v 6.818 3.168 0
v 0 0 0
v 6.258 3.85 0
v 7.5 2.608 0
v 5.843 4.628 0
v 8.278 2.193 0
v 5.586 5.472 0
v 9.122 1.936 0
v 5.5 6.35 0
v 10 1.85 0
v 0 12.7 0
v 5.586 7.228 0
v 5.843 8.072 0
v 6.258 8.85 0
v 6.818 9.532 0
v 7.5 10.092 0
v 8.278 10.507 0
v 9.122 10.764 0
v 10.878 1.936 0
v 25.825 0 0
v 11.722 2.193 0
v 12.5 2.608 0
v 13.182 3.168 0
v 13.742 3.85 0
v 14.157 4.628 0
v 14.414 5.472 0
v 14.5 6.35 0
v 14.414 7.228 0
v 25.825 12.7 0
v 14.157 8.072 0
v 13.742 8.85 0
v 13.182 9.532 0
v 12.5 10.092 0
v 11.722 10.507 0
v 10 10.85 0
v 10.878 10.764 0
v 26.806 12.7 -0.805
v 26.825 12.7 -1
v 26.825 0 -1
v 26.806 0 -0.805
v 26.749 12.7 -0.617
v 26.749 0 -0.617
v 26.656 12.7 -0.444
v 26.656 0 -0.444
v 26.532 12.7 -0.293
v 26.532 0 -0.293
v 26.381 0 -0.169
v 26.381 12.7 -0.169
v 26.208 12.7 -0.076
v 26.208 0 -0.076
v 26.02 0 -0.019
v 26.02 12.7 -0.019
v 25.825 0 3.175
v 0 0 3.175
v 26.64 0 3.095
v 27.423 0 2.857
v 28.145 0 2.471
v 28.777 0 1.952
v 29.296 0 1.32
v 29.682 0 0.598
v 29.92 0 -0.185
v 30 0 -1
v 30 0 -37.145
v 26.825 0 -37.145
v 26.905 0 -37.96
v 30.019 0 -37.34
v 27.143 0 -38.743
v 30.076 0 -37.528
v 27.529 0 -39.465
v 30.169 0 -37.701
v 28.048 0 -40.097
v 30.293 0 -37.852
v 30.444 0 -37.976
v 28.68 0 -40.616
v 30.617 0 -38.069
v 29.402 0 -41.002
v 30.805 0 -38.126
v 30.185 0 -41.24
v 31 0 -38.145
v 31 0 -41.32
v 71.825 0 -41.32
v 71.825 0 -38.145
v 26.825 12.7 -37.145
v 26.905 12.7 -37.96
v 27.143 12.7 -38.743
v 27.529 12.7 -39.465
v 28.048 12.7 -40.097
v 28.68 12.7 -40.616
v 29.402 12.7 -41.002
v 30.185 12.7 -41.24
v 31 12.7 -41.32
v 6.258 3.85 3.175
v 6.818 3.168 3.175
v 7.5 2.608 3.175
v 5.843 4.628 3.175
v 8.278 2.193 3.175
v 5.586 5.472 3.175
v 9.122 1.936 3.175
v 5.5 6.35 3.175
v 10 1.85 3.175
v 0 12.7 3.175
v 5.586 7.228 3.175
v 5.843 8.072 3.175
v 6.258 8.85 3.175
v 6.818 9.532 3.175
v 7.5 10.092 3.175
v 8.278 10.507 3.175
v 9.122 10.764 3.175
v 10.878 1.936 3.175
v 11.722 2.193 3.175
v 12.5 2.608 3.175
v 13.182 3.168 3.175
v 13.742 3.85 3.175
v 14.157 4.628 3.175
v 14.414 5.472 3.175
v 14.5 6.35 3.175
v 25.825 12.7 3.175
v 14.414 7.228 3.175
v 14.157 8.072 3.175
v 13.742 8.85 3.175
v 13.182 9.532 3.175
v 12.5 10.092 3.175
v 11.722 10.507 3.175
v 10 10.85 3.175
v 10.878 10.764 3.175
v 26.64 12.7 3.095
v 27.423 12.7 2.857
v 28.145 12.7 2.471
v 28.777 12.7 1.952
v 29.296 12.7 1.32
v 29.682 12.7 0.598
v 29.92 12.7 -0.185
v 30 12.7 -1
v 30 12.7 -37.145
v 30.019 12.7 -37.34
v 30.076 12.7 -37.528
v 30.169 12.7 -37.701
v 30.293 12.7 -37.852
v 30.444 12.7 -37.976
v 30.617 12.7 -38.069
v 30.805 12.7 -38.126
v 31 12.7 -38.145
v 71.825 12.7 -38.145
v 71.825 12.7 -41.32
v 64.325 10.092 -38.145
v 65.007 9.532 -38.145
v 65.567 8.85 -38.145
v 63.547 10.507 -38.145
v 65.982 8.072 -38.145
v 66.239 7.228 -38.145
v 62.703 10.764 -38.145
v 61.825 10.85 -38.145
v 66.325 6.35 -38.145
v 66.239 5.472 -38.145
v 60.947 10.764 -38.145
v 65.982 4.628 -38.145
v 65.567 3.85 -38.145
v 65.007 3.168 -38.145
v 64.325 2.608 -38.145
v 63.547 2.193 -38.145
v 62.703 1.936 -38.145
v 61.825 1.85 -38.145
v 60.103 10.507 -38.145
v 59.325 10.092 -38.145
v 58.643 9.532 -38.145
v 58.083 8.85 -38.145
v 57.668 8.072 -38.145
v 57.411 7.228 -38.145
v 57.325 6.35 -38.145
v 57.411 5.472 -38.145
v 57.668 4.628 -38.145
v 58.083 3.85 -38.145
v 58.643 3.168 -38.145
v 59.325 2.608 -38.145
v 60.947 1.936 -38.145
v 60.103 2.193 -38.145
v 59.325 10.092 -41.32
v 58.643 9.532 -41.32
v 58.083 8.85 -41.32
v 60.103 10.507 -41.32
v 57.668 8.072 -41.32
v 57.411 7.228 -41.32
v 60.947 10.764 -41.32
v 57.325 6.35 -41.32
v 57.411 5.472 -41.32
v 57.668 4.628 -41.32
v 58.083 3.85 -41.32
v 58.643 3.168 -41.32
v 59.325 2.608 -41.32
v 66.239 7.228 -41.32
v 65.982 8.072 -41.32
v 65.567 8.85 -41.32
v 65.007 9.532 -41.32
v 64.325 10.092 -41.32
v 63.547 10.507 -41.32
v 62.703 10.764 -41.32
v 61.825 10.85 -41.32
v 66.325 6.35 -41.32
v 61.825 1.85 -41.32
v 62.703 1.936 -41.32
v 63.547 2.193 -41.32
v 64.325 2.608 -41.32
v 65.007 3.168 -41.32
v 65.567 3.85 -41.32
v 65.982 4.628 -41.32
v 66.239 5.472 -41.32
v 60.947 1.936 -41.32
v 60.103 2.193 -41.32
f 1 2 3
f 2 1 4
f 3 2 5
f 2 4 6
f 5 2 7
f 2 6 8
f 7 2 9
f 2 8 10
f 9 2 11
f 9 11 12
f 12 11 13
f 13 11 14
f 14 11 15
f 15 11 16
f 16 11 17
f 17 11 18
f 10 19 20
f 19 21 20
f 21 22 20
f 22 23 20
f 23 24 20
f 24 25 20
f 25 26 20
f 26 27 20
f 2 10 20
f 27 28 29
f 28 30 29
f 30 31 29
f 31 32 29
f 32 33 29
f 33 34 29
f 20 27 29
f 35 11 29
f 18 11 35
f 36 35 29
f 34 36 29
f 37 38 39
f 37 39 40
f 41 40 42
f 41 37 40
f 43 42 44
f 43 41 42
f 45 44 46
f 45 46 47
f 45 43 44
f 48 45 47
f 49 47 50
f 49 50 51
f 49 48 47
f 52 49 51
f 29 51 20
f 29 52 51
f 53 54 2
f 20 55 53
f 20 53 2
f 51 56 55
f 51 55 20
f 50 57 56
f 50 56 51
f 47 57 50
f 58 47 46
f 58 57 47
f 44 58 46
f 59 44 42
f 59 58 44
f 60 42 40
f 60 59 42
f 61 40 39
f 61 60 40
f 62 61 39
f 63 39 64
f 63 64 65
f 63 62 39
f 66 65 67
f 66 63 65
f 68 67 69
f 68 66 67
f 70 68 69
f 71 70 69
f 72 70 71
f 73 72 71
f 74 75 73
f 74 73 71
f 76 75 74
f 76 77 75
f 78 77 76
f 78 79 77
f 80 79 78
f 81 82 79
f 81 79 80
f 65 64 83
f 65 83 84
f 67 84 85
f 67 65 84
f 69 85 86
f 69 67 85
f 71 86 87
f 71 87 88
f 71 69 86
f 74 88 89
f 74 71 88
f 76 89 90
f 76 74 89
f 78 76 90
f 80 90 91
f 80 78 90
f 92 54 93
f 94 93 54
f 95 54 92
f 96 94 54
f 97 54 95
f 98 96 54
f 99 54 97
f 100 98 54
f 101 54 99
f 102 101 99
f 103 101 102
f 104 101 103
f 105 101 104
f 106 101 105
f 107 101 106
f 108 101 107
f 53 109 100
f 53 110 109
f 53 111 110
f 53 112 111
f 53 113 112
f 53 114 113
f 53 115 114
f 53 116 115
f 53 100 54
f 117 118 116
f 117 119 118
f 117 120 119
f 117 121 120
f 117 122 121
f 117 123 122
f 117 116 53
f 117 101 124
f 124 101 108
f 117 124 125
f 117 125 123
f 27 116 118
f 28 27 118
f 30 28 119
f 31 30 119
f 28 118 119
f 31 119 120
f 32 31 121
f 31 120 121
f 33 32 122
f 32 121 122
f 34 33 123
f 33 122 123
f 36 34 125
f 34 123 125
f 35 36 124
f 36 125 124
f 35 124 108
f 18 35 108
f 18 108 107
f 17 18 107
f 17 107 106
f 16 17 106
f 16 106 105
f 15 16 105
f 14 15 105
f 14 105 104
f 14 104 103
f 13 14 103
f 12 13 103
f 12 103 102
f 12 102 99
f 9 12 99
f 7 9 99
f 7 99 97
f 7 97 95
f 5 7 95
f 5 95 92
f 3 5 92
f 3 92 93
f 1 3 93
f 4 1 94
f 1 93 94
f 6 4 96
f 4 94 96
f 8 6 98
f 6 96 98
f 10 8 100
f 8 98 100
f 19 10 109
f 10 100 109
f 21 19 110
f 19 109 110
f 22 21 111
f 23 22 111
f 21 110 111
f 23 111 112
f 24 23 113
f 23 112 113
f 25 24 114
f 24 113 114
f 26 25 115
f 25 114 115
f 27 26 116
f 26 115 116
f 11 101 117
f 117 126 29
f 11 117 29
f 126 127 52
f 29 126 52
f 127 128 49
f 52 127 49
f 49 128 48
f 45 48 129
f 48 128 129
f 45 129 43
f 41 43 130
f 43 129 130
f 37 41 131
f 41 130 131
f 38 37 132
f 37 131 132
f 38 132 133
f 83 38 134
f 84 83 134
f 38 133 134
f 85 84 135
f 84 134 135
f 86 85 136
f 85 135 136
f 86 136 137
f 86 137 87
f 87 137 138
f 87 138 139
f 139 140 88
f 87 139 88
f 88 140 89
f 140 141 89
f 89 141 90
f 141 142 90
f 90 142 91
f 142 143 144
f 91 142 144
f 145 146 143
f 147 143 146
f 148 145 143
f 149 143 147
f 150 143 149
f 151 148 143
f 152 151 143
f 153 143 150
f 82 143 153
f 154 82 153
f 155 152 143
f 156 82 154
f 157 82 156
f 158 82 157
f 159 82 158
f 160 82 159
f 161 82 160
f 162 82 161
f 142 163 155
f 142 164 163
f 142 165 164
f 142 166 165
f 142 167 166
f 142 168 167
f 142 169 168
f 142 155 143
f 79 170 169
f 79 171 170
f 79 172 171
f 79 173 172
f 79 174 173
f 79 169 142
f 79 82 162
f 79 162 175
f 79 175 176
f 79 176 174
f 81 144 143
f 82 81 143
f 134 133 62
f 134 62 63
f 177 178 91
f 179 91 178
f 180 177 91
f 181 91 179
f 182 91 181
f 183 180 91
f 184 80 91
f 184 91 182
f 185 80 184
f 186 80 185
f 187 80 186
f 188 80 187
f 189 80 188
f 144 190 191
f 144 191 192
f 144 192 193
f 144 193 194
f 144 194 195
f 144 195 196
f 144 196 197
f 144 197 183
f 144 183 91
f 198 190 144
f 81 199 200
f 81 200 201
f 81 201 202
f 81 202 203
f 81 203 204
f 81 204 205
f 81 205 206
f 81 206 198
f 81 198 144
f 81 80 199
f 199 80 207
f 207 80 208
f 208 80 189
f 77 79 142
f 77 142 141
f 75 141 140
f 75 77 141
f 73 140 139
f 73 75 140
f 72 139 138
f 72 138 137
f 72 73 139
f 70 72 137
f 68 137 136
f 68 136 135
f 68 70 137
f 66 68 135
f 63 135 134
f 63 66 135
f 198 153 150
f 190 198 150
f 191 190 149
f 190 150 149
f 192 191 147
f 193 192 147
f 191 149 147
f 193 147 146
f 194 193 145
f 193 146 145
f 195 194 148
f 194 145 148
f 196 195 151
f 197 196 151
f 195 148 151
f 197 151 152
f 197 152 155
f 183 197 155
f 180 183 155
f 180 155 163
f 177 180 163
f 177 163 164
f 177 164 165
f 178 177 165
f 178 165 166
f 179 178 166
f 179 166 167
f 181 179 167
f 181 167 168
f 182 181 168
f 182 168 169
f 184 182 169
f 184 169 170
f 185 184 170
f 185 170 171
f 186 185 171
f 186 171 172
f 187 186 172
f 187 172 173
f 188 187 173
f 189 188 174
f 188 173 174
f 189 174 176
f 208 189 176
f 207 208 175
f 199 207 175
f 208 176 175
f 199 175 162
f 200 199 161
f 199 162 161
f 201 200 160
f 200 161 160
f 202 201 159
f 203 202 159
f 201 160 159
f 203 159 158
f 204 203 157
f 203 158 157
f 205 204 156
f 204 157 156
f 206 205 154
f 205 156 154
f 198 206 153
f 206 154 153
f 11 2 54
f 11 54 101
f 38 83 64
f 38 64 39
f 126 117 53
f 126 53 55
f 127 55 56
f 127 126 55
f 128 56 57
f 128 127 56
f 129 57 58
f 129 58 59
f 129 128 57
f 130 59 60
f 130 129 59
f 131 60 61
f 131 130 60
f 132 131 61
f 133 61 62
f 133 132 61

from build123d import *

# Parameters (mm, degrees)
SKETCH1_W                    = 30
SKETCH1_H                    = 12.7
BOSS_EXTRUDE1_DEPTH          = 3.175
EDGE_FLANGE1_STRIP_W         = 14.7
EDGE_FLANGE1_STRIP_H         = 3.175
EDGE_FLANGE1_STRIP_CUT_DEPTH = 12.7
EDGE_FLANGE1_DEPTH           = 12.7
EDGE_FLANGE2_STRIP_W         = 14.7
EDGE_FLANGE2_STRIP_H         = 3.175
EDGE_FLANGE2_STRIP_CUT_DEPTH = 12.7
EDGE_FLANGE2_DEPTH           = 12.7
M8_CLEARANCE_HOLE1_D         = 9


# Sheet-metal steps are written as plain solids
with BuildPart() as part:
    # Sketch1 → Boss-Extrude1 (new body)
    with BuildSketch(Plane.XY):
        with Locations((15, 6.35)):
            Rectangle(SKETCH1_W, SKETCH1_H)
    extrude(amount=BOSS_EXTRUDE1_DEPTH)

    # Edge-Flange1 strip (across the edge) → Edge-Flange1 strip cut (cut)
    with BuildSketch(Plane(origin=(30, 12.7, 0), x_dir=(-1, 0, 0), z_dir=(0, -1, 0))):
        with Locations((-3.175, -1.5875)):
            Rectangle(EDGE_FLANGE1_STRIP_W, EDGE_FLANGE1_STRIP_H)
    extrude(amount=EDGE_FLANGE1_STRIP_CUT_DEPTH, mode=Mode.SUBTRACT)

    # Edge-Flange1 section (across the edge) → Edge-Flange1 (add)
    with BuildSketch(Plane(origin=(30, 12.7, 0), x_dir=(-1, 0, 0), z_dir=(0, -1, 0))):
        with BuildLine():
            Line((0, 1), (0, 41.32))
            Line((0, 41.32), (3.175, 41.32))
            Line((3.175, 41.32), (3.175, 1))
            ThreePointArc((3.175, 1), (3.467893219, 0.292893219), (4.175, 0))
            Line((4.175, 0), (4.175, -3.175))
            ThreePointArc((4.175, -3.175), (1.222829189, -1.952170811), (0, 1))
        make_face()
    extrude(amount=EDGE_FLANGE1_DEPTH)

    # Edge-Flange2 strip (across the edge) → Edge-Flange2 strip cut (cut)
    with BuildSketch(Plane(origin=(30, 0, -41.32), x_dir=(0, 0, 1), z_dir=(0, 1, 0))):
        with Locations((-3.175, -1.5875)):
            Rectangle(EDGE_FLANGE2_STRIP_W, EDGE_FLANGE2_STRIP_H)
    extrude(amount=EDGE_FLANGE2_STRIP_CUT_DEPTH, mode=Mode.SUBTRACT)

    # Edge-Flange2 section (across the edge) → Edge-Flange2 (add)
    with BuildSketch(Plane(origin=(30, 0, -41.32), x_dir=(0, 0, 1), z_dir=(0, 1, 0))):
        with BuildLine():
            Line((0, 1), (0, 41.825))
            Line((0, 41.825), (3.175, 41.825))
            Line((3.175, 41.825), (3.175, 1))
            ThreePointArc((3.175, 1), (3.467893219, 0.292893219), (4.175, 0))
            Line((4.175, 0), (4.175, -3.175))
            ThreePointArc((4.175, -3.175), (1.222829189, -1.952170811), (0, 1))
        make_face()
    extrude(amount=EDGE_FLANGE2_DEPTH)

    # M8 Clearance Hole1 (through all)
    with Locations(Plane(origin=(0, 0, -41.32), x_dir=(-1, 0, 0), z_dir=(0, 0, -1))):
        with Locations((-61.825, 6.35), (-10, 6.35)):
            Hole(M8_CLEARANCE_HOLE1_D / 2)


solid = part.part
